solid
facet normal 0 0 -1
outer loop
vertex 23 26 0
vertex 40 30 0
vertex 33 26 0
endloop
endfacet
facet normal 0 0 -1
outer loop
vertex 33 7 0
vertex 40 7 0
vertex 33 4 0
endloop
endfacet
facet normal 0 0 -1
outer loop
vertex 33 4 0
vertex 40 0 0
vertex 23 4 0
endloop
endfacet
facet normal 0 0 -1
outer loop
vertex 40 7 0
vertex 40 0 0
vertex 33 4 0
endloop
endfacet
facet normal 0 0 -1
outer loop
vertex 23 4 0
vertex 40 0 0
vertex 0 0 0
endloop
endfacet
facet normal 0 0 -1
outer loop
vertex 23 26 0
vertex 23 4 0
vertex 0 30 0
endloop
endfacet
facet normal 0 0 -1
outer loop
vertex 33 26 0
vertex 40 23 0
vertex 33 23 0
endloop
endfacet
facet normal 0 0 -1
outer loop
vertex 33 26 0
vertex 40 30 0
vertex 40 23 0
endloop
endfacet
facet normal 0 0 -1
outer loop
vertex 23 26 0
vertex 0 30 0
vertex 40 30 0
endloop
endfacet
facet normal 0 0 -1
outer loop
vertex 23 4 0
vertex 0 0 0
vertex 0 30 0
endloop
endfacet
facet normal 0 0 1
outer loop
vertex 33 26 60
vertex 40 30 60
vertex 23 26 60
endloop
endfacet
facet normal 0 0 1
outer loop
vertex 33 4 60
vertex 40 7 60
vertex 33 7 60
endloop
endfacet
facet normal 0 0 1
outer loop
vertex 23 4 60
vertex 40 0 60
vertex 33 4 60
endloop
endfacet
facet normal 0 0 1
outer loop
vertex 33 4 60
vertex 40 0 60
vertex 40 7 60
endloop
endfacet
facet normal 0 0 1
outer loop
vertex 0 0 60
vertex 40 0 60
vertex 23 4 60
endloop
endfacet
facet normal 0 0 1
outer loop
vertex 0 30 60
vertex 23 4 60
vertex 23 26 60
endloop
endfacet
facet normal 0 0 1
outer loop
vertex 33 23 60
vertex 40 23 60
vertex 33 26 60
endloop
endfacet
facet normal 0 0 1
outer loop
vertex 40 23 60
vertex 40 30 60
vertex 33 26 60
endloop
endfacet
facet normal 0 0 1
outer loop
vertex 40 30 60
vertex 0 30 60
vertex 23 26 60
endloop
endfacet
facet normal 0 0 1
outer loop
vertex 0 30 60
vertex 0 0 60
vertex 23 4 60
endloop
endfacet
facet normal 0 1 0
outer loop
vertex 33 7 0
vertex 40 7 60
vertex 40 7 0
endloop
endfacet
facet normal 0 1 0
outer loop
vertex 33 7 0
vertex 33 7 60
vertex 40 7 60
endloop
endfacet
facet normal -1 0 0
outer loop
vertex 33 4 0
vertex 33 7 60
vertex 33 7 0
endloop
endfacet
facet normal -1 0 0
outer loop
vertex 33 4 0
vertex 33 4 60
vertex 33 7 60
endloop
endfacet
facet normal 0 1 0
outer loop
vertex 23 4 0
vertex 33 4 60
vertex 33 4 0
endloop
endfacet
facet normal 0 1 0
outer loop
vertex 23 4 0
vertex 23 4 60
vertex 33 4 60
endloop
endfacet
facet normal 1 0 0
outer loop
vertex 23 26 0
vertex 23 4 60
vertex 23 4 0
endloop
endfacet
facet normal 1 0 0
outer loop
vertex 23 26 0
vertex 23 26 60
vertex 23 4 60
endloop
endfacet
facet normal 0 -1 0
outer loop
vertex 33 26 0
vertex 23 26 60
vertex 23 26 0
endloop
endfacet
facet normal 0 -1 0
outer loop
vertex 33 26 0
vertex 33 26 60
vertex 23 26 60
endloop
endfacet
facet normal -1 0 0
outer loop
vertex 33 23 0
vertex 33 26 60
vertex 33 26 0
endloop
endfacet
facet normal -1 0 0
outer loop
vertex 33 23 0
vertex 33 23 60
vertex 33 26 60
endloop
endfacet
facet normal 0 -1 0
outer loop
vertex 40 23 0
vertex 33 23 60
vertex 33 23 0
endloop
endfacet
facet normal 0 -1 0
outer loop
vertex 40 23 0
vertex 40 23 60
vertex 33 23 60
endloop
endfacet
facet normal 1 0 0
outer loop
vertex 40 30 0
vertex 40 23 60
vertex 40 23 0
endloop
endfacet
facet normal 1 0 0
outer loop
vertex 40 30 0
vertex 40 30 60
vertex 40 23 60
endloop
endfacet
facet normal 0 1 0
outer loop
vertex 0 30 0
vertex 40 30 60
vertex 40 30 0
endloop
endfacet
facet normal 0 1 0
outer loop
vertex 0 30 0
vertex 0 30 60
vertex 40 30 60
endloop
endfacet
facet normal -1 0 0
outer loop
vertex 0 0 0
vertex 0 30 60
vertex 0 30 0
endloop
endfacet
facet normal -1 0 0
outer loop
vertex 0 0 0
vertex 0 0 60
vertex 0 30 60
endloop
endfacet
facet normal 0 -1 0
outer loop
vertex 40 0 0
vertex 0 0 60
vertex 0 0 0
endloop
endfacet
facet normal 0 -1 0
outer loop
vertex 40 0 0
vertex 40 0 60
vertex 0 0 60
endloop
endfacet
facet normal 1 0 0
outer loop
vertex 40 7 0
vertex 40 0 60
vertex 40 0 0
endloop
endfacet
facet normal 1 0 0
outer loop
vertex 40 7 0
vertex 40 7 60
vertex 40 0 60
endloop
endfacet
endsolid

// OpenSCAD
$fn = 32;

// ----------------------------------------------------------------------
// T-slot rail: 40 x 30 mm section, 60 mm long
// ----------------------------------------------------------------------

// --- parameters (mm) ---
profile_height = 60;      // extrusion height
profile_points = 12;      // points of the closed outline

profile = [[0, 0], [40, 0], [40, 7], [33, 7], [33, 4], [23, 4], [23, 26], [33, 26], [33, 23], [40, 23], [40, 30], [0, 30]];  // single closed polygon, 12 points, counter clockwise

// --- the one profile operation ---
linear_extrude(height = profile_height) polygon(points = profile);
